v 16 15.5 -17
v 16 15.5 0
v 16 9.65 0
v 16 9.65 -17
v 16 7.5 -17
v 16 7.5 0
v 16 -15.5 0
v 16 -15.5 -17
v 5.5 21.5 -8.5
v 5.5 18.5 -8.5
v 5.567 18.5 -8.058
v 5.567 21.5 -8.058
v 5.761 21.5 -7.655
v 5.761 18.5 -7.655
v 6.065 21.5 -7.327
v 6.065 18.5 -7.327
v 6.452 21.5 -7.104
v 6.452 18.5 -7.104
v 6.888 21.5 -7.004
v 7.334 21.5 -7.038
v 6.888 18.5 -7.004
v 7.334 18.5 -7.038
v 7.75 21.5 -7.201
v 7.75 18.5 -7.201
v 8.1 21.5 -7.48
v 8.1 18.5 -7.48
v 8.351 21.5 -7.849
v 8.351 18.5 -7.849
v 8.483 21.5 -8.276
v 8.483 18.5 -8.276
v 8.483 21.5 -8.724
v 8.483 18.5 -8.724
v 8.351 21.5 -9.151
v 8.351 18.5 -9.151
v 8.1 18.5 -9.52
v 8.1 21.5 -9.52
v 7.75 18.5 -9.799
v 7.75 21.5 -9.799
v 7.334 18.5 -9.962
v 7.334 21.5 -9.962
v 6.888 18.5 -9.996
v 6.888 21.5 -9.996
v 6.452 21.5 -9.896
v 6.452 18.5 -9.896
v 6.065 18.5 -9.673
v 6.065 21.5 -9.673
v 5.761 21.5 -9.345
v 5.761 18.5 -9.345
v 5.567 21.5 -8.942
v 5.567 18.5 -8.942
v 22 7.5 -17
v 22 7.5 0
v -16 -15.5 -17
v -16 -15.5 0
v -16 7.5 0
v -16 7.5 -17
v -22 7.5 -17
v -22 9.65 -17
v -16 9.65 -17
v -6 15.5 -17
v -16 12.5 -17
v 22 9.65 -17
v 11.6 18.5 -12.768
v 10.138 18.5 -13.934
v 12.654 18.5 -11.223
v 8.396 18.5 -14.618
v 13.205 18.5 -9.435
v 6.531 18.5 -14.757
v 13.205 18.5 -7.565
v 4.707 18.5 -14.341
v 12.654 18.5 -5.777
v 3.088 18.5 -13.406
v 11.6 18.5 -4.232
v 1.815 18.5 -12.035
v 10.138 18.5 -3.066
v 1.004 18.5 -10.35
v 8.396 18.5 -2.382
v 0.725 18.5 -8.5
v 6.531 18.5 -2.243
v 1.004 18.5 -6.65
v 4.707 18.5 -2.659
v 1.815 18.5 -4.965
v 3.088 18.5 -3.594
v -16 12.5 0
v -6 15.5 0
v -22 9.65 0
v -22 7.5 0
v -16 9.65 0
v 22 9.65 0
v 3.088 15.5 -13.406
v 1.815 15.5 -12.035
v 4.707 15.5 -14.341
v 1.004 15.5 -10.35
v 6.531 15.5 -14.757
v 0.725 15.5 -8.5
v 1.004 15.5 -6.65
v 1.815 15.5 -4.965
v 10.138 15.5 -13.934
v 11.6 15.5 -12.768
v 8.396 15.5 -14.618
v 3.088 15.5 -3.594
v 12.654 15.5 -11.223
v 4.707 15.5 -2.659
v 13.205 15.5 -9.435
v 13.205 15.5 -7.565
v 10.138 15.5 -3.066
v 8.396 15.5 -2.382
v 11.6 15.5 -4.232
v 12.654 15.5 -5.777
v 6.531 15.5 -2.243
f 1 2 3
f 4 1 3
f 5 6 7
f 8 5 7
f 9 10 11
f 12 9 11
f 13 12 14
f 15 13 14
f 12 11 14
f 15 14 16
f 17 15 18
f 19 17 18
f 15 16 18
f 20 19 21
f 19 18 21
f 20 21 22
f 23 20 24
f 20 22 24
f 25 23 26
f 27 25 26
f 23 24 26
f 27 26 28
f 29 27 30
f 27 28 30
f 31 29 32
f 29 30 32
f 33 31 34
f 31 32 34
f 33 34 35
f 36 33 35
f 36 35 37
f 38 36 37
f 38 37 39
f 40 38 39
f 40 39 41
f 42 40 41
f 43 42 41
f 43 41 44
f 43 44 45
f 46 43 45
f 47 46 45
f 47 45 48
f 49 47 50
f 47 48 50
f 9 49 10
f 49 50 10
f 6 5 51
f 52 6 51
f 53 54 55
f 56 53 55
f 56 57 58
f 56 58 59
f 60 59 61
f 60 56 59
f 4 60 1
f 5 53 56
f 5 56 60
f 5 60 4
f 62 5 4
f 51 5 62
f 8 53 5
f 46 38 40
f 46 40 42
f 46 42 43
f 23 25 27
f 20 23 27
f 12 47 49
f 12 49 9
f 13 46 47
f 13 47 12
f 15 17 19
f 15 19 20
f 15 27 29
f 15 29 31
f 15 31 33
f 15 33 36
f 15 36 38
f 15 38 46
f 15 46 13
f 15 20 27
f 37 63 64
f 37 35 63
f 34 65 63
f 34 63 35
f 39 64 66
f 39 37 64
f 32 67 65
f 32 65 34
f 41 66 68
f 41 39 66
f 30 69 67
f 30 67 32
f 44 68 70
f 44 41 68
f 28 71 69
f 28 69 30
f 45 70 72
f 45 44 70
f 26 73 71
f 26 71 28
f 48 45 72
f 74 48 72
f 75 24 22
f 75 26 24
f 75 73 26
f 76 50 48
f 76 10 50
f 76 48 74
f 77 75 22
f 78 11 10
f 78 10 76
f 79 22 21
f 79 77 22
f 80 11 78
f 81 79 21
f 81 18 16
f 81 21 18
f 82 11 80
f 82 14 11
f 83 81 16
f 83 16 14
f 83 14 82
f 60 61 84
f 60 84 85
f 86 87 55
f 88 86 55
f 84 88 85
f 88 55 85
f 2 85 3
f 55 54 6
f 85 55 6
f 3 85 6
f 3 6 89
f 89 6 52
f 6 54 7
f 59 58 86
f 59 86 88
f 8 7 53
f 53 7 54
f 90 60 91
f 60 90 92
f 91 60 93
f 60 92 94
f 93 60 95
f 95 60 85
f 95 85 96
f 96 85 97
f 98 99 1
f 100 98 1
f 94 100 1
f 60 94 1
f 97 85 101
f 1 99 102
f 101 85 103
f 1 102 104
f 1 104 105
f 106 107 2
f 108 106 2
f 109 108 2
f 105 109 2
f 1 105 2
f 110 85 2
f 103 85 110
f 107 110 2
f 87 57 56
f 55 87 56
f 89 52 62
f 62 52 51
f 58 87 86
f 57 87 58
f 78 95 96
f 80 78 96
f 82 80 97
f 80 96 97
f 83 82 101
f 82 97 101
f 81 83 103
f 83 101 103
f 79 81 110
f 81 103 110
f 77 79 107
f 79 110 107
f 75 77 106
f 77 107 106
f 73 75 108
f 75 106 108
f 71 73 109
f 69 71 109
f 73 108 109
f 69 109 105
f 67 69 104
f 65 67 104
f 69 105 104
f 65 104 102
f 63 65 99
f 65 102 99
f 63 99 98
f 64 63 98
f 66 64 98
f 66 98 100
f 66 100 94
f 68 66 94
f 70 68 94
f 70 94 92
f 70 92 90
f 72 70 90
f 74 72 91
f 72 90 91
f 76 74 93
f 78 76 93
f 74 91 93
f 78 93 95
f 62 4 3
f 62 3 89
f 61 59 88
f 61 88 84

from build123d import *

# Parameters (mm, degrees)
BOSS_EXTRUDE1_DEPTH = 17
SKETCH2_W           = 44
SKETCH2_H           = 17
BOSS_EXTRUDE2_DEPTH = 2.15
SKETCH3_R           = 6.275
BOSS_EXTRUDE3_DEPTH = 3
SKETCH4_R           = 1.5
BOSS_EXTRUDE4_DEPTH = 3


with BuildPart() as part:
    # Sketch1 → Boss-Extrude1 (new body)
    with BuildSketch(Plane.XY):
        Polygon((-16, 12.5), (-6, 15.5), (16, 15.5), (16, -15.5), (-16, -15.5), align=None)
    extrude(amount=-BOSS_EXTRUDE1_DEPTH)

    # Sketch2 → Boss-Extrude2 (add)
    with BuildSketch(Plane(origin=(0, 7.5, 0), x_dir=(1, 0, 0), z_dir=(0, 1, 0))):
        with Locations((0, 8.5)):
            Rectangle(SKETCH2_W, SKETCH2_H)
    extrude(amount=BOSS_EXTRUDE2_DEPTH)

    # Sketch3 → Boss-Extrude3 (add)
    with BuildSketch(Plane(origin=(0, 15.5, 0), x_dir=(1, 0, 0), z_dir=(0, 1, 0))):
        with Locations(Location((7, 8.5, 0), (0, 0, 180))):
            Circle(SKETCH3_R)
    extrude(amount=BOSS_EXTRUDE3_DEPTH)

    # Sketch4 → Boss-Extrude4 (add)
    with BuildSketch(Plane(origin=(0, 18.5, 0), x_dir=(1, 0, 0), z_dir=(0, 1, 0))):
        with Locations(Location((7, 8.5, 0), (0, 0, 180))):
            Circle(SKETCH4_R)
    extrude(amount=BOSS_EXTRUDE4_DEPTH)


solid = part.part
